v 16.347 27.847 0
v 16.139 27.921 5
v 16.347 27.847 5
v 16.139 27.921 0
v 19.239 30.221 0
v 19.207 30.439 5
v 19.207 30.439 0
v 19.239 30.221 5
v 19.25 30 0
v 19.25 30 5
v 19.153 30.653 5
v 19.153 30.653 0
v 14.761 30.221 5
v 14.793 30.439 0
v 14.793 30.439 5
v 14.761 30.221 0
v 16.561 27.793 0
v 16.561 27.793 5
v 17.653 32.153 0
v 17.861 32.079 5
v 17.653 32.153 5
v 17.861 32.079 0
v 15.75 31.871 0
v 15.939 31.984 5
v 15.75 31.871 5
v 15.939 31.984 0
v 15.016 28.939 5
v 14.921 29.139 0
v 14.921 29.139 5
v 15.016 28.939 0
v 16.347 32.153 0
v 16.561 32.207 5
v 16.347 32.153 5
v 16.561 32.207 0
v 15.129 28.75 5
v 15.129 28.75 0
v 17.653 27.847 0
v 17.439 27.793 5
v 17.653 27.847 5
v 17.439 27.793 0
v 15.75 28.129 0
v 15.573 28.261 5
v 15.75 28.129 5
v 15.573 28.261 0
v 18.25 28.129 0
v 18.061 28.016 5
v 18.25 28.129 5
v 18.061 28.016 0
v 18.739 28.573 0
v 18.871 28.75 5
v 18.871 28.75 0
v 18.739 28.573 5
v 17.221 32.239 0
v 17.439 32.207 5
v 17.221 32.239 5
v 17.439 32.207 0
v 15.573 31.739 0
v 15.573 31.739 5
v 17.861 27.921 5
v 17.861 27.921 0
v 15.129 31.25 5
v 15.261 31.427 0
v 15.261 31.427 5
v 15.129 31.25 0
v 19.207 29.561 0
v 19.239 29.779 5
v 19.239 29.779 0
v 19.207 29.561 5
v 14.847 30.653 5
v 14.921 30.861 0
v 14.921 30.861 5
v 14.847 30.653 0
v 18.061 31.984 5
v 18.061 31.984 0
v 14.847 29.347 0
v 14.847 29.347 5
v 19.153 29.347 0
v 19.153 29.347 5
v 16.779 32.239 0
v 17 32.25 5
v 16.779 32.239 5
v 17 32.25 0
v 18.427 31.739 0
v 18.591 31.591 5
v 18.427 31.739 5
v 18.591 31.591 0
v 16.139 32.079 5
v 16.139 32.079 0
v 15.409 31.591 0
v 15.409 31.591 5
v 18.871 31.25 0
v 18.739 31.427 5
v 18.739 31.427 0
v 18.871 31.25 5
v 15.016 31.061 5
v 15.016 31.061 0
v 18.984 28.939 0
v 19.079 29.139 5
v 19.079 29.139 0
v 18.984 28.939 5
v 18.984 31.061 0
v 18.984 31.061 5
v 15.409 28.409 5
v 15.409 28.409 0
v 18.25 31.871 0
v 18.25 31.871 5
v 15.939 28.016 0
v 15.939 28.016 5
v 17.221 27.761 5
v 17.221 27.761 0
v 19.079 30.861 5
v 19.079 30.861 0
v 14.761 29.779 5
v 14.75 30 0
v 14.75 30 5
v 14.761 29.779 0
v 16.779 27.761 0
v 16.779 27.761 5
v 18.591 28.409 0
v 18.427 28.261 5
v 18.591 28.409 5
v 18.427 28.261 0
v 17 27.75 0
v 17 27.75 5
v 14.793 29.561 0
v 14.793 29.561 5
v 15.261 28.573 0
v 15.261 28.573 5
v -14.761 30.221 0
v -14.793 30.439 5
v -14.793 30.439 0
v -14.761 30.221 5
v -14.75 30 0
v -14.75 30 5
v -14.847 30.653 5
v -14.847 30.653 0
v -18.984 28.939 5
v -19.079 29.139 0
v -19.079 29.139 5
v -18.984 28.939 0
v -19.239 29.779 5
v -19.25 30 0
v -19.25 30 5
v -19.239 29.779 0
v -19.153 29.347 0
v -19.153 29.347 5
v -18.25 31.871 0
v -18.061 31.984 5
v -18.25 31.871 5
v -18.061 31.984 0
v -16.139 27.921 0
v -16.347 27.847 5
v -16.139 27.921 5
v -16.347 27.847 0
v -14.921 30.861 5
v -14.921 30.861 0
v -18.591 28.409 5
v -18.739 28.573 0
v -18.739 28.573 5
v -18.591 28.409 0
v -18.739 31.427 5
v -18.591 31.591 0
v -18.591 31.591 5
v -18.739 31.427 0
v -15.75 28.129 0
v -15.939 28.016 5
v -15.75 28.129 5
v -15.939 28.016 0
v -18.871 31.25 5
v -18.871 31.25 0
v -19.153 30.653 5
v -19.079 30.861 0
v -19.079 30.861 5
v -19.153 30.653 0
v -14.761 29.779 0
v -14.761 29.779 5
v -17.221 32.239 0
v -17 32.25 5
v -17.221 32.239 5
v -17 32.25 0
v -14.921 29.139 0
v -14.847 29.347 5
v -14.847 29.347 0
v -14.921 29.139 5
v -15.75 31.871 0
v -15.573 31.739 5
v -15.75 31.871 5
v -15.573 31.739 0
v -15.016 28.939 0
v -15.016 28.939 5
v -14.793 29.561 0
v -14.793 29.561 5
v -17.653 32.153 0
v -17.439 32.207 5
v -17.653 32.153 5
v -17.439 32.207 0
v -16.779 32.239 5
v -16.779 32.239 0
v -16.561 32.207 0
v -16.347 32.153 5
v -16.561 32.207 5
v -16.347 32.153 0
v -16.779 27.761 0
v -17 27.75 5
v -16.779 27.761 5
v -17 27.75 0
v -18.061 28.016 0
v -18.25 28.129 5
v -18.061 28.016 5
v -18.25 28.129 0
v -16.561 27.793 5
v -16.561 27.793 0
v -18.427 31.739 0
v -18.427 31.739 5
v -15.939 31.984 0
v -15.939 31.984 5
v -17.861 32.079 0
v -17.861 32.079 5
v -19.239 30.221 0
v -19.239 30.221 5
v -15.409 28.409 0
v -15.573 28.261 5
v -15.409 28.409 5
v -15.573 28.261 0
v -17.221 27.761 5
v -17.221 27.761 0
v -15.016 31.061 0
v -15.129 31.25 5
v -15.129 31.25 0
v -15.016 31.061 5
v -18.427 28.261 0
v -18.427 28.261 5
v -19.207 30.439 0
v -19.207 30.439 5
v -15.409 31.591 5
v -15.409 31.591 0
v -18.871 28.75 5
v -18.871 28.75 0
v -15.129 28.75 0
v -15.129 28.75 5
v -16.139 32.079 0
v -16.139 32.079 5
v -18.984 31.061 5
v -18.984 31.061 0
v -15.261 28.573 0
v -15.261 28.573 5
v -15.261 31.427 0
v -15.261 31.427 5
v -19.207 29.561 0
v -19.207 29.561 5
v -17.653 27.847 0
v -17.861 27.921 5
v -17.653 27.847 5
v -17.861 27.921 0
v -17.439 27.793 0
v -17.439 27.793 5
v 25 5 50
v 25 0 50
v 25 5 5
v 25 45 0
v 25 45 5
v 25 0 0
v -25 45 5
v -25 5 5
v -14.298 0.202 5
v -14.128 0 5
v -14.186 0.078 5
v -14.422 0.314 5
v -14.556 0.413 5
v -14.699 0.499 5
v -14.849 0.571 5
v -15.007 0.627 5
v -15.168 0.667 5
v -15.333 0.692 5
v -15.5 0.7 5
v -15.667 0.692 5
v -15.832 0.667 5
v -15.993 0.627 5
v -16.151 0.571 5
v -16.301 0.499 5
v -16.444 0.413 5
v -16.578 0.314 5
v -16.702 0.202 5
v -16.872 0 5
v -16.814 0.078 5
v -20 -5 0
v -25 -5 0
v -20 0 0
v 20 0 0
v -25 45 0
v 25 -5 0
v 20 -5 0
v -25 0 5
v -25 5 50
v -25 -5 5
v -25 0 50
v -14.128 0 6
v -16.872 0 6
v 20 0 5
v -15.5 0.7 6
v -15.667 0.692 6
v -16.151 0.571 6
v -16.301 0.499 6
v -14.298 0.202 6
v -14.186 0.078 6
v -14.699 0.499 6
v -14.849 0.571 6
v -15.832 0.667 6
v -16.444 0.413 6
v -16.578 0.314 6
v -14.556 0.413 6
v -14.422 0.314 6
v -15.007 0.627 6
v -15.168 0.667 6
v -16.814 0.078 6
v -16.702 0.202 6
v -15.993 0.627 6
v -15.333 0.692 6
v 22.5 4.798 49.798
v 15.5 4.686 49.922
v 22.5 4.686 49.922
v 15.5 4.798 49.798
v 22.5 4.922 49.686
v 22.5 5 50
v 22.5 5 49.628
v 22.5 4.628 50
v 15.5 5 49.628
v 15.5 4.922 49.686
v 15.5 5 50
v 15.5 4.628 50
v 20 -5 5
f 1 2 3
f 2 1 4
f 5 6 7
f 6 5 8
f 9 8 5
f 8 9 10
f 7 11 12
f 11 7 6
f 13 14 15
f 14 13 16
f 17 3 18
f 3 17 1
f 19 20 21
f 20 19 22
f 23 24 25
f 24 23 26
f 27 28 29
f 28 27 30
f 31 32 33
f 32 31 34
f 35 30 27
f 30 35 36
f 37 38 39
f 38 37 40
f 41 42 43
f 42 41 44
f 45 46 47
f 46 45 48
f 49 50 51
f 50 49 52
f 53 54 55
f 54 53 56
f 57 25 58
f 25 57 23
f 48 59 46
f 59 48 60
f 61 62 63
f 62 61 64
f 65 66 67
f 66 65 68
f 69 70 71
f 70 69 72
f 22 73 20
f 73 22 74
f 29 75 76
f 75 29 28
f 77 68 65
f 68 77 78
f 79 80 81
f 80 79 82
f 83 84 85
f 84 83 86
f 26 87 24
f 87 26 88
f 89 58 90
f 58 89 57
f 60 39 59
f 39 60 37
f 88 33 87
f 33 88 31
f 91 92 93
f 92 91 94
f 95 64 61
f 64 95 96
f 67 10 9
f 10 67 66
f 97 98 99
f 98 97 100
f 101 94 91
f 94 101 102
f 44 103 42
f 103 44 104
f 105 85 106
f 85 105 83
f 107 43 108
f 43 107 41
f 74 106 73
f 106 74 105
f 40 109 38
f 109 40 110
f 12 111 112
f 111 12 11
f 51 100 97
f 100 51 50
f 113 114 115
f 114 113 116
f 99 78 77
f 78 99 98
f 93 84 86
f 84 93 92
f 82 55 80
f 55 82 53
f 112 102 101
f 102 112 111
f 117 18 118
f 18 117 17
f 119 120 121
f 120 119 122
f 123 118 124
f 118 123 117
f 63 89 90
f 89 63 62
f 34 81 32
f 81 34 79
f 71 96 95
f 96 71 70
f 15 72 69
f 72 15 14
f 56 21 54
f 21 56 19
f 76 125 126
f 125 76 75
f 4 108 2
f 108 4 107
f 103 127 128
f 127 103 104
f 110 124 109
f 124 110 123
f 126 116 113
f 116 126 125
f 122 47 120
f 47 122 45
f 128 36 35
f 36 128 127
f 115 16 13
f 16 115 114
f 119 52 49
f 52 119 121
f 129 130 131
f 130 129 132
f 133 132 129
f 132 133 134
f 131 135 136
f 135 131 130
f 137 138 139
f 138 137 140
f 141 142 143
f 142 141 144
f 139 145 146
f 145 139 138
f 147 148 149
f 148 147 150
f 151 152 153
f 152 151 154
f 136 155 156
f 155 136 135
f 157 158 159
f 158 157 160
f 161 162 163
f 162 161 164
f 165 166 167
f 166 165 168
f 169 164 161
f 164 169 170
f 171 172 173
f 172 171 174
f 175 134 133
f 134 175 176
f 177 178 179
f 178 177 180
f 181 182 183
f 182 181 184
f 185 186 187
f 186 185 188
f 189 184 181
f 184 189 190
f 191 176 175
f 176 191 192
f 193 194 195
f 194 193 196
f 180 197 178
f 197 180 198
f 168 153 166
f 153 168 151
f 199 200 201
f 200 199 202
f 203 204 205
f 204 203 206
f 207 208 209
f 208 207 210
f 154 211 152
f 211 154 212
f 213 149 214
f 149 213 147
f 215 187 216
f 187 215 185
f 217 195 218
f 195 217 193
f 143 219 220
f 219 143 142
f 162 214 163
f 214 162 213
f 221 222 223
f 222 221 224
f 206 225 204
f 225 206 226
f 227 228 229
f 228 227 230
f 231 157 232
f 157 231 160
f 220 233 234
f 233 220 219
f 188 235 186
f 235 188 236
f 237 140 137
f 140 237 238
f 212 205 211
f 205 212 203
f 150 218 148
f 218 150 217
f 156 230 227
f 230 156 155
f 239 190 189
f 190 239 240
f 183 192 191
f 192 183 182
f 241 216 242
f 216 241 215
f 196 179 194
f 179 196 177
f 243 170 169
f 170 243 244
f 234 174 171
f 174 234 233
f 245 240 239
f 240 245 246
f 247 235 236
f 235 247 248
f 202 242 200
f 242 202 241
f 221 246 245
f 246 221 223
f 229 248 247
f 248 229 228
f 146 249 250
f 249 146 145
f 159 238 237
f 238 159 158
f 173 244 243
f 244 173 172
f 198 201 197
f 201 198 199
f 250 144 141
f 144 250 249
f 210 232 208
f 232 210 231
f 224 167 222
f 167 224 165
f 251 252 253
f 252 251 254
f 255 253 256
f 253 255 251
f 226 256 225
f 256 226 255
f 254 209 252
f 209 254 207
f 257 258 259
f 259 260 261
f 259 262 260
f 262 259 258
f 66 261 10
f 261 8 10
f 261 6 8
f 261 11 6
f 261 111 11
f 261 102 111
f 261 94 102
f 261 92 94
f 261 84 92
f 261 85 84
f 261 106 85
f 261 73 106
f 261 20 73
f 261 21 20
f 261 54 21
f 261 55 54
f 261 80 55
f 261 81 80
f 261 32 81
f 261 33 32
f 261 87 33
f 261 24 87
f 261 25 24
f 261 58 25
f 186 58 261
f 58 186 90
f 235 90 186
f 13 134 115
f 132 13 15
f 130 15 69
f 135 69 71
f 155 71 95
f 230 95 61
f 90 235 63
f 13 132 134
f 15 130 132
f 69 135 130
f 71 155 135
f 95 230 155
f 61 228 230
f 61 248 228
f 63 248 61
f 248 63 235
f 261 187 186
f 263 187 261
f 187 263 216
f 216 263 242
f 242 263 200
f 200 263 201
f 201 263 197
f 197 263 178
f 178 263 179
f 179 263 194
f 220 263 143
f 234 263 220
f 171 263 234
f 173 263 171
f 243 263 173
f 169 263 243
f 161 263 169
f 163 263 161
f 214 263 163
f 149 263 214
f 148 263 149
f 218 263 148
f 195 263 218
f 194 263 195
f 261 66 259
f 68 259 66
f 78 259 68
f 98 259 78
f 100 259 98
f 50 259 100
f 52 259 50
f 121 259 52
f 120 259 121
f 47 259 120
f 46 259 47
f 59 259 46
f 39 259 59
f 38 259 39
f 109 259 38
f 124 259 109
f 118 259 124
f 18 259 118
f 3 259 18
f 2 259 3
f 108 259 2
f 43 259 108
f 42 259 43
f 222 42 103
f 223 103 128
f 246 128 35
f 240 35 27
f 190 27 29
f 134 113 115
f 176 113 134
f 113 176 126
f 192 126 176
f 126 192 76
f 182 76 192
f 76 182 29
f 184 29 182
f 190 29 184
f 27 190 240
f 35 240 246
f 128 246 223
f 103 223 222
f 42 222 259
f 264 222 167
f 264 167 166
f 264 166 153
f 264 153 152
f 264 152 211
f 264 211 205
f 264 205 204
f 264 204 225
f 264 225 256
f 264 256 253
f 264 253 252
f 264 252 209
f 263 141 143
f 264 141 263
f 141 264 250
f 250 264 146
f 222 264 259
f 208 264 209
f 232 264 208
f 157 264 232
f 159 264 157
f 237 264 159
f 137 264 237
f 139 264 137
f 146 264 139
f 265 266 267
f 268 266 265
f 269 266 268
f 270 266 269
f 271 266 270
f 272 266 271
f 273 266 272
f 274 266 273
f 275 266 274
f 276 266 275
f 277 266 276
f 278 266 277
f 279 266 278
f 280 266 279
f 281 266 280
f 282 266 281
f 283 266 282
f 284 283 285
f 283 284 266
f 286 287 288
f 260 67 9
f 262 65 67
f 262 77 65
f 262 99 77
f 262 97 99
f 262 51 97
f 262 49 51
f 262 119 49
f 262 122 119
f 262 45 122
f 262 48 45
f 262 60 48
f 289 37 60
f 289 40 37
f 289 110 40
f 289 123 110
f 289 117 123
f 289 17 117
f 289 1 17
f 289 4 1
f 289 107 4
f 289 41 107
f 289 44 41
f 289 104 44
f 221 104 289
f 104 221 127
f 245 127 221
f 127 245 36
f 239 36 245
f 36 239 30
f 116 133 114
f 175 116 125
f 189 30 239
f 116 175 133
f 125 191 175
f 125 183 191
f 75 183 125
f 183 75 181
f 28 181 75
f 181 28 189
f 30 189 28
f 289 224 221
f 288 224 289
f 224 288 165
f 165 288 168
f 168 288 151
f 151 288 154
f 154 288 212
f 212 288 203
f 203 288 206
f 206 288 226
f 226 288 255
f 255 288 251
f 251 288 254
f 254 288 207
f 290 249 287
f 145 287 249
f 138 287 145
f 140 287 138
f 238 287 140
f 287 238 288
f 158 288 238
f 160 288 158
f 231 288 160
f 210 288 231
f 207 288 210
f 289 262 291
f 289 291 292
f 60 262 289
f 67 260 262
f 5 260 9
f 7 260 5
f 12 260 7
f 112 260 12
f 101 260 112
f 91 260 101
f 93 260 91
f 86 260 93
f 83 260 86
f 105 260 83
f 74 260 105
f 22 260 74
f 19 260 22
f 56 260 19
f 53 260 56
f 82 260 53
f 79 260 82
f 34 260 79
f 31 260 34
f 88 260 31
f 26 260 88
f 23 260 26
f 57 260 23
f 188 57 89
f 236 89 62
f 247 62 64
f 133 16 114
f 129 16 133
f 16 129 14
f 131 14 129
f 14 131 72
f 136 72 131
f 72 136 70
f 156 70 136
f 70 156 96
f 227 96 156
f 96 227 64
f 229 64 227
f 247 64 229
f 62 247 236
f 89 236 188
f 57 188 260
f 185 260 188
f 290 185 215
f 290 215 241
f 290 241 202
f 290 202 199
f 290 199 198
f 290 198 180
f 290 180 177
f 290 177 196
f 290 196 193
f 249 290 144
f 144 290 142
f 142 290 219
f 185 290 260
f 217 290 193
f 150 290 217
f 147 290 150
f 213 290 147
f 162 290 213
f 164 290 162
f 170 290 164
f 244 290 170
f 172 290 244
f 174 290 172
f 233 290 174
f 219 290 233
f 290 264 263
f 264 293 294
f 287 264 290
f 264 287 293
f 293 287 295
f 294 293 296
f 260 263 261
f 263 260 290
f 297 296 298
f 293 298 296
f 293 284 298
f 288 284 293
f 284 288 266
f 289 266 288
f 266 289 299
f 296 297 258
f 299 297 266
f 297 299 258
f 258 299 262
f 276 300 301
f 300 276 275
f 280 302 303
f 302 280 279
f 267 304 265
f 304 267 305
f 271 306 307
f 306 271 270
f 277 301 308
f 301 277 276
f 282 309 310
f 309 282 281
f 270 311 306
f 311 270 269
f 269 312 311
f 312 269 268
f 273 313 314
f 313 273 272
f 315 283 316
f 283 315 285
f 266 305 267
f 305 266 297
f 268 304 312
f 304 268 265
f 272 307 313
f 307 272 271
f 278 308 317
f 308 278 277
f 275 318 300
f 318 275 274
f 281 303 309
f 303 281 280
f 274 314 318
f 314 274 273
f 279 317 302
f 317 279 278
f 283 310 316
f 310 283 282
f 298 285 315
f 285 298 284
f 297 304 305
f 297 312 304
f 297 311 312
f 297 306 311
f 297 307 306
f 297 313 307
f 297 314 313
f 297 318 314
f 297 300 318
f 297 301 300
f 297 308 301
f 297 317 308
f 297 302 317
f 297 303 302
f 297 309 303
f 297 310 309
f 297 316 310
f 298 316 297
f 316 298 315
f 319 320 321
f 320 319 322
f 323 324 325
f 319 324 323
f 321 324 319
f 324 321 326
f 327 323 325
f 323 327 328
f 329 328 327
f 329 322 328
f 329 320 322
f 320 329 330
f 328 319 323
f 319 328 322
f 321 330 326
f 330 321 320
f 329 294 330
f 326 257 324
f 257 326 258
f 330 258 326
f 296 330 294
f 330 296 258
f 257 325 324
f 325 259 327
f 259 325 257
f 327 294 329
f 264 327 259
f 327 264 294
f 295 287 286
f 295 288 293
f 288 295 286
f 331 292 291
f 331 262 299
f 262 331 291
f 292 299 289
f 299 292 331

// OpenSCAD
// L-shaped mounting bracket for NEMA 17 stepper motor
// Print orientation: base plate on bed, motor plate builds upward (+Z)

// ---------------- Parameters ----------------
$fn = 64;

// Base plate
base_x0 = -25;    // base plate X start
base_x1 = 25;     // base plate X end
base_y0 = 0;      // base plate Y start
base_y1 = 45;     // base plate Y end
base_z0 = 0;      // base plate Z start
base_z1 = 5;      // base plate Z end
hole_m4_x = -17;  // M4 through-hole X position
hole_m4_y = 30;   // M4 through-hole Y position
hole_m4_d = 4.5;  // M4 through-hole diameter

// Motor plate
motor_x0 = -25;   // motor plate X start
motor_x1 = 25;    // motor plate X end
motor_y0 = 0;     // motor plate Y start
motor_y1 = 5;     // motor plate Y end
motor_z0 = 0;     // motor plate Z start
motor_z1 = 50;    // motor plate Z end
boss_d = 23;      // motor centring boss hole diameter
boss_x = 0;       // boss hole X centre
boss_z = 28;      // boss hole Z centre
screw_d = 3.4;    // M3 screw hole diameter
screw_p = 31;     // square pitch for screw holes
screw_n = 4;      // number of screw holes

// Gussets
gusset_t = 5;     // gusset thickness (along X)
gusset_y0 = 5;    // gusset leg along Y
gusset_z0 = 5;    // gusset leg along Z

// ---------------- Model ----------------
union() {
    // Base plate with M4 through-holes
    difference() {
        translate([base_x0, base_y0, base_z0])
            cube([base_x1 - base_x0, base_y1 - base_y0, base_z1 - base_z0]);
        for (sx = [-1, 1])
            translate([sx * hole_m4_x, hole_m4_y, -1])
                cylinder(d = hole_m4_d, h = base_z1 + 2);
    }

    // Motor plate with boss hole and M3 screw holes
    difference() {
        translate([motor_x0, motor_y0, motor_z0])
            cube([motor_x1 - motor_x0, motor_y1 - motor_y0, motor_z1 - motor_z0]);
        // Boss hole along Y
        translate([boss_x, -1, boss_z])
            rotate([90, 0, 0])
                cylinder(d = boss_d, h = motor_y1 - motor_y0 + 2);
        // Screw holes on square pattern
        for (i = [0 : screw_n - 1]) {
            a = (i < 2) ? 0 : 90;
            translate([
                (i < 2) ? -screw_p / 2 : screw_p / 2,
                (i < 2) ? -1 : motor_y1 + 1,
                (i % 2 == 0) ? -1 : motor_z1 + 1
            ])
                rotate([0, a, 0])
                    cylinder(d = screw_d, h = motor_y1 - motor_y0 + 2);
        }
    }

    // Left gusset (flush with left edge, x = -25 to -20)
    translate([-25, motor_y0, motor_z0])
        rotate([90, 0, 0])
            linear_extrude(height = gusset_t)
                polygon(points = [
                    [motor_y0, motor_z0],
                    [gusset_y0, motor_z0],
                    [motor_y0, gusset_z0]
                ]);

    // Right gusset (flush with right edge, x = 20 to 25)
    translate([20, motor_y0, motor_z0])
        rotate([90, 0, 0])
            linear_extrude(height = gusset_t)
                polygon(points = [
                    [motor_y0, motor_z0],
                    [gusset_y0, motor_z0],
                    [motor_y0, gusset_z0]
                ]);
}
